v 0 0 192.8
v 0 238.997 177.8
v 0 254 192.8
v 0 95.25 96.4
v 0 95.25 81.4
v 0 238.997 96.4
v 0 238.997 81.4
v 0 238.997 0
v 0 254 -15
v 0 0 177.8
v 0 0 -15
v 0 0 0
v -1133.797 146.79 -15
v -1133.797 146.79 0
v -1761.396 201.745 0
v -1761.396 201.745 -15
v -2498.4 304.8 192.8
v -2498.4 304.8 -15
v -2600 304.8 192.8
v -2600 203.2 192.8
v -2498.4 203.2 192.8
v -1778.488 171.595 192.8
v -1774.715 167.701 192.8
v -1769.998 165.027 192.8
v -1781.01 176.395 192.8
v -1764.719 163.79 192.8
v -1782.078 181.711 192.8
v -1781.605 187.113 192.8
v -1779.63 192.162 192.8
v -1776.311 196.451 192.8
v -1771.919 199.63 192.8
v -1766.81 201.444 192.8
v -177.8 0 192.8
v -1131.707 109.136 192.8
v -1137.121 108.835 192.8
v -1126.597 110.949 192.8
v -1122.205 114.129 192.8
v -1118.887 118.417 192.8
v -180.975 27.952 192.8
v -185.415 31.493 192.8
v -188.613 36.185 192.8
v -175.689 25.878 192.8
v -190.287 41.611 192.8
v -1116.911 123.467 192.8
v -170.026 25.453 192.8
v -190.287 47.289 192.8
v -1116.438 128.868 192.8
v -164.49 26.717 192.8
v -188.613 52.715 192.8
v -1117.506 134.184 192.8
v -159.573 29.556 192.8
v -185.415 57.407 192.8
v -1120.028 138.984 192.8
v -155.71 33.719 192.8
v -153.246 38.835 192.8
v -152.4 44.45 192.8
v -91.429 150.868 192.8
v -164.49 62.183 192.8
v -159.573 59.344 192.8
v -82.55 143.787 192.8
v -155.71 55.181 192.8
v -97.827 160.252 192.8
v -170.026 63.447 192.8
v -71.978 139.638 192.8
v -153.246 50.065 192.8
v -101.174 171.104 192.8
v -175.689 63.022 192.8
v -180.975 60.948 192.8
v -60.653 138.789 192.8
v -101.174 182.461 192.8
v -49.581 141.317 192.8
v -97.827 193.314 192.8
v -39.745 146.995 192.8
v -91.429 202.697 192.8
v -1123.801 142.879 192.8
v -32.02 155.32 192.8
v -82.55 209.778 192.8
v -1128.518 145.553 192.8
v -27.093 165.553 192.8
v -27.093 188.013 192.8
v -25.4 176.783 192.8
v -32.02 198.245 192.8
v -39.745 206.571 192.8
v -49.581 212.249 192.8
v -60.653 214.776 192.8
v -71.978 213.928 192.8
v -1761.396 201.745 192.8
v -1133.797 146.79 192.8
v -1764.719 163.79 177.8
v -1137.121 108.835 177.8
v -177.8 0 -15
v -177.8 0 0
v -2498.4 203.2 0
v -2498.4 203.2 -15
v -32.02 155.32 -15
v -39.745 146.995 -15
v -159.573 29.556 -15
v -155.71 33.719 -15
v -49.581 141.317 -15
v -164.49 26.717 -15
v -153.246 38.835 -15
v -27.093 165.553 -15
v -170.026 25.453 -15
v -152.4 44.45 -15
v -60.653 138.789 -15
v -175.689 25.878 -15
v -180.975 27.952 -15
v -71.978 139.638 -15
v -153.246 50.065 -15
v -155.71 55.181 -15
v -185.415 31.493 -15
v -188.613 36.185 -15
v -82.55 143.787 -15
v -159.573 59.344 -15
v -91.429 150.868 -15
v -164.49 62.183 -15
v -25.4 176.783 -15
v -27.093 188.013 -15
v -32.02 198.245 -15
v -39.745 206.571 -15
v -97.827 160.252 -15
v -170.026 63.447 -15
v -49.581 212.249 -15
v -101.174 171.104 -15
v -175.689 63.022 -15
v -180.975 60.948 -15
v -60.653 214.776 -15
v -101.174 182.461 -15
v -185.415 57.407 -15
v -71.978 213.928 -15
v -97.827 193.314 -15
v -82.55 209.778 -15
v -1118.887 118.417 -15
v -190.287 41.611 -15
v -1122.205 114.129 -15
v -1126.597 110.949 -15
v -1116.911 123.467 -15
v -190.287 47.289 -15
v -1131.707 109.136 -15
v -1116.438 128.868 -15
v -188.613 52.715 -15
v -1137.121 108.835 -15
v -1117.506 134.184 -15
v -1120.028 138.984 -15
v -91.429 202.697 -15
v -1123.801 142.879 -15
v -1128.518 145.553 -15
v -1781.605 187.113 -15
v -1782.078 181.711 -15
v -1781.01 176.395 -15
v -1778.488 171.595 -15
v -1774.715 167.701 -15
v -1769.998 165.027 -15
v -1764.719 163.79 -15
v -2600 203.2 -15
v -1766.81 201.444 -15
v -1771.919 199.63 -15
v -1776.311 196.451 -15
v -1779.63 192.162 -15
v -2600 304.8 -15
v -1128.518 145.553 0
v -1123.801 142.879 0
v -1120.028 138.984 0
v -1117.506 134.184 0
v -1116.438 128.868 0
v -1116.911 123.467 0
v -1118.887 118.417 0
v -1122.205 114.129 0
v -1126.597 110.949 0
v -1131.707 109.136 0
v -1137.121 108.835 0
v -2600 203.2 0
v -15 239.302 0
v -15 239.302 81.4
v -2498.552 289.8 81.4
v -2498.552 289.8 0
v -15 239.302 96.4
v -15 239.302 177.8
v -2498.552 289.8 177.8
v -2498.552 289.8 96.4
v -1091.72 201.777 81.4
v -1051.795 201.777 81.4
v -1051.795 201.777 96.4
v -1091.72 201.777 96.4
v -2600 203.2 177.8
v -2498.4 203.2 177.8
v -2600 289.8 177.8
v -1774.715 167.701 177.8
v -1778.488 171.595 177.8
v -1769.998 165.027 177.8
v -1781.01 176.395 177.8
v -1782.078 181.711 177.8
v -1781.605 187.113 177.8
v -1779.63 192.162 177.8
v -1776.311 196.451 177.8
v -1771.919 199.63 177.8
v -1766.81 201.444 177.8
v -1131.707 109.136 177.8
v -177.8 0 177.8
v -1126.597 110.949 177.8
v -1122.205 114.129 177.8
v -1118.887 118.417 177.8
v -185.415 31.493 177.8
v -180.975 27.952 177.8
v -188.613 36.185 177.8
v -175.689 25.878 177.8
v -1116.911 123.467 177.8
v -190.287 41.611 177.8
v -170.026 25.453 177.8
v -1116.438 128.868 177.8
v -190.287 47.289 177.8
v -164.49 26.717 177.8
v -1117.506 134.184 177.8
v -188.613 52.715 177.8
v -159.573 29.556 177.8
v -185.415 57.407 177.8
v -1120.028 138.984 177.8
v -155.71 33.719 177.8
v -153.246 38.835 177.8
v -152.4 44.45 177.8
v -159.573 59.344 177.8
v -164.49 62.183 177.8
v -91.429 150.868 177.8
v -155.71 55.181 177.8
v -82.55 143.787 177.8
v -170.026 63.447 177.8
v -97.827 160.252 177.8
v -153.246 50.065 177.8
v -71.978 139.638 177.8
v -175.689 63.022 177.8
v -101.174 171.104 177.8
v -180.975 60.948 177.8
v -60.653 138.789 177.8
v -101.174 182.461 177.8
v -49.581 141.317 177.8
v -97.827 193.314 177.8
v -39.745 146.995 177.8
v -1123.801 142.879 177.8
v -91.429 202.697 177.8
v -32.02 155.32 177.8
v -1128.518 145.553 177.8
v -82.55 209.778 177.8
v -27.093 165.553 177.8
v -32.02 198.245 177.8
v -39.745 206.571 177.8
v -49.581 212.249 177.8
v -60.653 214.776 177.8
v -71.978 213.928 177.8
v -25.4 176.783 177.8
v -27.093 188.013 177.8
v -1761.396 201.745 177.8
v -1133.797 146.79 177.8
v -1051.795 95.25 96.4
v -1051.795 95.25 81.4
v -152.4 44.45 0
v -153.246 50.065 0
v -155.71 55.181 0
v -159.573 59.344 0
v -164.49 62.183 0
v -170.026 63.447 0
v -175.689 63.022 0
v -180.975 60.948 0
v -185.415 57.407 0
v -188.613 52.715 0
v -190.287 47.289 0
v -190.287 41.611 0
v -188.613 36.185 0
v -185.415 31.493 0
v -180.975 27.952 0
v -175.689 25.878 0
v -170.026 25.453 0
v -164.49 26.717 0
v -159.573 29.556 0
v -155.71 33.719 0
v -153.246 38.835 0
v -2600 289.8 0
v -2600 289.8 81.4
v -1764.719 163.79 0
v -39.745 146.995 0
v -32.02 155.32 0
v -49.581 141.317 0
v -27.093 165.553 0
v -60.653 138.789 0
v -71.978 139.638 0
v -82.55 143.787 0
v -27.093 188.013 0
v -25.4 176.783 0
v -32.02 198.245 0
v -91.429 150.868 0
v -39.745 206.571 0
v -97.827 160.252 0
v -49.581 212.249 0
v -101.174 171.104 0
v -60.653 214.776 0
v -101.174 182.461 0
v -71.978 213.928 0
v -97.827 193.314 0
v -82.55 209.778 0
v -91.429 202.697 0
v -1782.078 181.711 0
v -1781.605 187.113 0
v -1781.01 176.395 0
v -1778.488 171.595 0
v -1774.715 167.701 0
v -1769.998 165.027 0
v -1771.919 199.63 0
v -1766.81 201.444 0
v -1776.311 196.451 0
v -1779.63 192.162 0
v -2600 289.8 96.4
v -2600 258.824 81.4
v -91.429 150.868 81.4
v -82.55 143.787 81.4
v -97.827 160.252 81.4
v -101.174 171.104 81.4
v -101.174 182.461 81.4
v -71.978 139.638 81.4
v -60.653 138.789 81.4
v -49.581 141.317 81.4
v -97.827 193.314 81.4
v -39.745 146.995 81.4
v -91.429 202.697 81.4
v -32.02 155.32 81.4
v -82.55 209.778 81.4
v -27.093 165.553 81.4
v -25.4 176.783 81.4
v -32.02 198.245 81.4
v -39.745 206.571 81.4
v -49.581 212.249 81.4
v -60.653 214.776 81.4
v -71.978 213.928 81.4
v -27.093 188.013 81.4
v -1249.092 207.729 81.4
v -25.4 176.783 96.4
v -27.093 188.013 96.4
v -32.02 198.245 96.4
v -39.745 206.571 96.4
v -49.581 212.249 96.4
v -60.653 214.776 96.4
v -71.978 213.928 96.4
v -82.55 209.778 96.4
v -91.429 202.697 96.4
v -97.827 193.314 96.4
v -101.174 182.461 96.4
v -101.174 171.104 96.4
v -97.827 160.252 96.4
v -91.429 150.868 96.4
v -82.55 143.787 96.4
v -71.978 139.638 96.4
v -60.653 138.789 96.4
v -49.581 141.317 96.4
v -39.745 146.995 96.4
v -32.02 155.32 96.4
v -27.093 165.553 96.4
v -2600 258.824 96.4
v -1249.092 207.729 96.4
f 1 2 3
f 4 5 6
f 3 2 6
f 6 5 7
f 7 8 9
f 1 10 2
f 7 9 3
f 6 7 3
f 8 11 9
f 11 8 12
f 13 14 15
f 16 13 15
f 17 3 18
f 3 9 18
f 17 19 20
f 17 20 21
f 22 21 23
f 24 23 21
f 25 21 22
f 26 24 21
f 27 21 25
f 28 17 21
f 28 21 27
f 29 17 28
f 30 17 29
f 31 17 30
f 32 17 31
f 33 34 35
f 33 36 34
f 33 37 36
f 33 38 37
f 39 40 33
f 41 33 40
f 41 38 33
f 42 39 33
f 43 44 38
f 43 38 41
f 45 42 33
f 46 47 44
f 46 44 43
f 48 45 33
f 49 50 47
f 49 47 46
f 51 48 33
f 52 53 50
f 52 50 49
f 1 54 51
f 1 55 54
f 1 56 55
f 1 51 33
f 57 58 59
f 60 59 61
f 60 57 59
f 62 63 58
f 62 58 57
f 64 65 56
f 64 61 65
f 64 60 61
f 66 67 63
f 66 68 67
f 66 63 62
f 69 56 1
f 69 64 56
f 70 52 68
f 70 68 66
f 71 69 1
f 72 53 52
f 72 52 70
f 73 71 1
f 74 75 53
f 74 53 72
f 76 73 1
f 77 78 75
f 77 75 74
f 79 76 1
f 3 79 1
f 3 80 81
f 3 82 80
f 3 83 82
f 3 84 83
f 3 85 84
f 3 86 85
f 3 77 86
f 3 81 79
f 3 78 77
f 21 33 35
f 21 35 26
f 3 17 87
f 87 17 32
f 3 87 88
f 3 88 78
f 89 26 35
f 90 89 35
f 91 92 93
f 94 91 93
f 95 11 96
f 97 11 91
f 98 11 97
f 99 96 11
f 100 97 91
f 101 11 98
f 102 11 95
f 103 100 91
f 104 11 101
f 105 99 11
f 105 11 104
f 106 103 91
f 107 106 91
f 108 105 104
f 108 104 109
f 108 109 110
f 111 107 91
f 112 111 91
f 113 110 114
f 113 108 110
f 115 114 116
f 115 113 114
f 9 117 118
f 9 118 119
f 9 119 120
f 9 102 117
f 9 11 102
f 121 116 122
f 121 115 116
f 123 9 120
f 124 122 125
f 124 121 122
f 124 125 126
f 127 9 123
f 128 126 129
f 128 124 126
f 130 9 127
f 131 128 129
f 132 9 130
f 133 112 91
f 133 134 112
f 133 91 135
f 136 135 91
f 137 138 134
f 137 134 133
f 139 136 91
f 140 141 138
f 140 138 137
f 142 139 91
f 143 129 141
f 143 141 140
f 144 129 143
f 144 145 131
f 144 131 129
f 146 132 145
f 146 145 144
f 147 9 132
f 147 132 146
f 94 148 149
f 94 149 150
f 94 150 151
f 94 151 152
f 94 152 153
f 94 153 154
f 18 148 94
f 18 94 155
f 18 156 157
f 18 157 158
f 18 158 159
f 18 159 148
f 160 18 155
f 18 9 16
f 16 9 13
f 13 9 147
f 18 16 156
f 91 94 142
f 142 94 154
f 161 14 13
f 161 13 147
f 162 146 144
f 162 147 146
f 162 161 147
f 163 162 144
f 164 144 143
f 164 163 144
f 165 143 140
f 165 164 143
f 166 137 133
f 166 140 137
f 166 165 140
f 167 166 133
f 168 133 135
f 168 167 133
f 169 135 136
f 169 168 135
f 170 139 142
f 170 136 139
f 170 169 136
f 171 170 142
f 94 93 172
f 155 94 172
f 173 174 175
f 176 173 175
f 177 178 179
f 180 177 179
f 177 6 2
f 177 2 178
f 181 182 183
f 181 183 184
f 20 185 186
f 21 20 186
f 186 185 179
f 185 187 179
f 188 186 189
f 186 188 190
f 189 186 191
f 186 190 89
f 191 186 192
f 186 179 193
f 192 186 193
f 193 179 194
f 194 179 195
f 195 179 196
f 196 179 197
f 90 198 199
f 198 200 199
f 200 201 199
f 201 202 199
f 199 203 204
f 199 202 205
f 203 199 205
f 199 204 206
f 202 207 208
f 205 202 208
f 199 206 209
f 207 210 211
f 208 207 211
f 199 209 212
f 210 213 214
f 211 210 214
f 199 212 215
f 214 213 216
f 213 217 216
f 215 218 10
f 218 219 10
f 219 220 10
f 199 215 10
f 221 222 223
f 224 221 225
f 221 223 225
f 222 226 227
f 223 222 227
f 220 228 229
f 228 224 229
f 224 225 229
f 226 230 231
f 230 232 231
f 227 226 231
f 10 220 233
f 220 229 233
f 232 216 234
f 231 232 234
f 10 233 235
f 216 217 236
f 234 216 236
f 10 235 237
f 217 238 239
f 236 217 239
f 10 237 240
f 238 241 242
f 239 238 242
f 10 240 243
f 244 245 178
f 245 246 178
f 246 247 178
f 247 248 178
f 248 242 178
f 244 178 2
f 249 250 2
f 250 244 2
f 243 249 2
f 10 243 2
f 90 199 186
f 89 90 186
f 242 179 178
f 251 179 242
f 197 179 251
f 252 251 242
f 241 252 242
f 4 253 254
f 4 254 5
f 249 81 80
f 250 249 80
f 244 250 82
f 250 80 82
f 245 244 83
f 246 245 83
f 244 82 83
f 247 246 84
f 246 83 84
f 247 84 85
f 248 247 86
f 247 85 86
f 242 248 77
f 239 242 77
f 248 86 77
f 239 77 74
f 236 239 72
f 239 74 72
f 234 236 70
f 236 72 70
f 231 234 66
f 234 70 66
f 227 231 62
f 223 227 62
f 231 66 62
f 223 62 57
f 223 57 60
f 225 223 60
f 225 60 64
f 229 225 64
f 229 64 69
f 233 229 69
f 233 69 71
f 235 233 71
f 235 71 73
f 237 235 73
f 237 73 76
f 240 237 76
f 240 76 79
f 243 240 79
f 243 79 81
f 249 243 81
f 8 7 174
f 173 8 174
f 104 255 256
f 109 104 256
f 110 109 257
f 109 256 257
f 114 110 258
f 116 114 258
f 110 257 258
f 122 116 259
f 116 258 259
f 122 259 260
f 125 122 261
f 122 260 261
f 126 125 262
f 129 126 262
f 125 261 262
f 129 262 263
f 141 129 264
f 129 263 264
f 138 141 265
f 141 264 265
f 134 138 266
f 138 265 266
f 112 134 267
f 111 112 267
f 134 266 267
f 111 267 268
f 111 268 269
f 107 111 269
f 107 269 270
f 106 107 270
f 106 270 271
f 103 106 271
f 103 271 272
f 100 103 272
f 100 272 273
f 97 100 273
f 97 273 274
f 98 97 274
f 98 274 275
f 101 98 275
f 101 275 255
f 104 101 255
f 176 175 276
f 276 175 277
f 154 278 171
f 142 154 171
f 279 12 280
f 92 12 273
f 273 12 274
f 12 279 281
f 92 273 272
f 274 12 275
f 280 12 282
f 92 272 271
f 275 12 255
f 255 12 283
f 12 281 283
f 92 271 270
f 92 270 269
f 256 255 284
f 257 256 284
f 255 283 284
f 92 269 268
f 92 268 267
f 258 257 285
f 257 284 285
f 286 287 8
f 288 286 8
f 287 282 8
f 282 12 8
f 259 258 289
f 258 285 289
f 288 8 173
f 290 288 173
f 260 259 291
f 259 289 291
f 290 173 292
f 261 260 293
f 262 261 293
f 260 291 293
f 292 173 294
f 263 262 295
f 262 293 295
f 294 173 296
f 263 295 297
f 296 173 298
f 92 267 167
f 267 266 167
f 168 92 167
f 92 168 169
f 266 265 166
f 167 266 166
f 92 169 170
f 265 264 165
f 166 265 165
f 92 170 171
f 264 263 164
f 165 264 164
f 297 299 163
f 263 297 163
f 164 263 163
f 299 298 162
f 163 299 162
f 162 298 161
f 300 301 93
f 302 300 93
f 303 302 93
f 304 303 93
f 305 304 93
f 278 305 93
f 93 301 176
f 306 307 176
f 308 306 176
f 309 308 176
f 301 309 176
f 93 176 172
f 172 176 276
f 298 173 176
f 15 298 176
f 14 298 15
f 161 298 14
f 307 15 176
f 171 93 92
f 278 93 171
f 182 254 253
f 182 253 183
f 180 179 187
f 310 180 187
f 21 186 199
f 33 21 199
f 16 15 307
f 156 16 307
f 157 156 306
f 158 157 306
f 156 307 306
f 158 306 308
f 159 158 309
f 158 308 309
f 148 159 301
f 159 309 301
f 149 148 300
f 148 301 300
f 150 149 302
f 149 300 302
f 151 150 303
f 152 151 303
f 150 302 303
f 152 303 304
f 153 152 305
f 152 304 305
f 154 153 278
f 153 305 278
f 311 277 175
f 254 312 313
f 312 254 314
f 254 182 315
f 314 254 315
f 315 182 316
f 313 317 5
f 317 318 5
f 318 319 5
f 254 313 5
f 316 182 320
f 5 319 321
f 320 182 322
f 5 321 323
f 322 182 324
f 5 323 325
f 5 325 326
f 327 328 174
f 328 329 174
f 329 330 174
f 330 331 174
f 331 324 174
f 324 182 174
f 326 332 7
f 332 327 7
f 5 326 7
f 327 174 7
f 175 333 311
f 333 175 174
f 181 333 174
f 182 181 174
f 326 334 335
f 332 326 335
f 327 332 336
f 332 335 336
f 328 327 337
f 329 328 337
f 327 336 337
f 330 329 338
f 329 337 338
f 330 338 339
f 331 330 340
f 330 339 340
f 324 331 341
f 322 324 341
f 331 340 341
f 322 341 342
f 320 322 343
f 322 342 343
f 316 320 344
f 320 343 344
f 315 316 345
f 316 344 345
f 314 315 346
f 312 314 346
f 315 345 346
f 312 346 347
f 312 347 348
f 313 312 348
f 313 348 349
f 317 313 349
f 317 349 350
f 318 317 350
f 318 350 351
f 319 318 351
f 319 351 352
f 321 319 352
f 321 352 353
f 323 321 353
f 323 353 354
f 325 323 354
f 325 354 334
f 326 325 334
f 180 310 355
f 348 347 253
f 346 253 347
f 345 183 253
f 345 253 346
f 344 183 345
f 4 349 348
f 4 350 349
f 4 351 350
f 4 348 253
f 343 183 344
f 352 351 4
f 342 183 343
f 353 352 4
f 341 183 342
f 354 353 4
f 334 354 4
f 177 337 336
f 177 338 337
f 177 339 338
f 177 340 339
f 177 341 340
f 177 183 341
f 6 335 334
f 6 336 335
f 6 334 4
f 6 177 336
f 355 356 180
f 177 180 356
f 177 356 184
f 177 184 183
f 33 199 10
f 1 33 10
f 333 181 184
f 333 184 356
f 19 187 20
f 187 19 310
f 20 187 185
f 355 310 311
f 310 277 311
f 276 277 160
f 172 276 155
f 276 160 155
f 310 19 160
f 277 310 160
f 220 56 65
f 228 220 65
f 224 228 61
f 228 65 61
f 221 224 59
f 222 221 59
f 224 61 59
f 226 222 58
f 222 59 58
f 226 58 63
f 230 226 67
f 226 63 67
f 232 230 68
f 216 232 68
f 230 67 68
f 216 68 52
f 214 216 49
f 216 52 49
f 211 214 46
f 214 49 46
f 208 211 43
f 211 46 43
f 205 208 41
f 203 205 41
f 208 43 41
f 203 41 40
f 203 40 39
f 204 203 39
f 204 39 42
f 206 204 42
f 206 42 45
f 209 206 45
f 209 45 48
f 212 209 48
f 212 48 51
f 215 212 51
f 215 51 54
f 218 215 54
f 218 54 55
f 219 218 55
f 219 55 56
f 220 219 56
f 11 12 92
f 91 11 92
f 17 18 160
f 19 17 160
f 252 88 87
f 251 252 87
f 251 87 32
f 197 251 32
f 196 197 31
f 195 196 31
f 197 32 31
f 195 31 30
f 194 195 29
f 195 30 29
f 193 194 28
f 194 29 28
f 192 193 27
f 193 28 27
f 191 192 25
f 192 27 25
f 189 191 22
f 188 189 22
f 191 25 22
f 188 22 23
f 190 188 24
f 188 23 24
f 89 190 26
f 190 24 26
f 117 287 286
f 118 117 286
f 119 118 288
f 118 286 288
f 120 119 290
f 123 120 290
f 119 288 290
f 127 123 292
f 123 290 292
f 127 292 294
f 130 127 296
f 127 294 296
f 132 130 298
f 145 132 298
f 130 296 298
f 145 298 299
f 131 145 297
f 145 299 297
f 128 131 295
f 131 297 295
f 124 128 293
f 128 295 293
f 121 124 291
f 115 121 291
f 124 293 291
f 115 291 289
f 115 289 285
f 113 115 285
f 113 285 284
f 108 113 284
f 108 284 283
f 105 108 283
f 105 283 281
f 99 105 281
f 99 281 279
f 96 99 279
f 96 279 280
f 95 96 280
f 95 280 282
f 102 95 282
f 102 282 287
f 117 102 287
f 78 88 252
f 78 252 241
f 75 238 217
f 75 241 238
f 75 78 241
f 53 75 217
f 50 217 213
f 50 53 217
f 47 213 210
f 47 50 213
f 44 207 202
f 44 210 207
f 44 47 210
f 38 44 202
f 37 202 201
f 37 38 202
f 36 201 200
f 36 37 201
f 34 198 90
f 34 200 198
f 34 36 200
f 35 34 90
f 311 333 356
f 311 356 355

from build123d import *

# Parameters (mm, degrees)
BOSS_EXTRUDE1_DEPTH      = 15
BOSS_EXTRUDE2_DEPTH      = 15
BOSS_EXTRUDE3_DEPTH      = 192.8
BOSS_EXTRUDE4_DEPTH      = 7.5
BOSS_EXTRUDE4_DEPTH_BACK = 7.5
SKETCH5_R                = 38.1
SKETCH5_R_2              = 19.05
CUT_EXTRUDE1_DEPTH       = 2627.039580814
CUT_EXTRUDE2_DEPTH       = 15
CUT_EXTRUDE12_DEPTH      = 60
CUT_EXTRUDE16_DEPTH      = 2627.039580814
CUT_EXTRUDE16_DEPTH_BACK = 2627.039580814
SKETCH16_R               = 19.05
CUT_EXTRUDE17_DEPTH      = 2627.039580814
CUT_EXTRUDE17_DEPTH_BACK = 2627.039580814
SKETCH18_W               = 39.925079479
SKETCH18_H               = 106.526969349
CUT_EXTRUDE18_DEPTH      = 96.4


with BuildPart() as part:
    # Sketch1 → Boss-Extrude1 (new body)
    with BuildSketch(Plane.XY):
        Polygon((-2600, 304.8), (-2498.4, 304.8), (0, 254), (0, 0), (-177.8, 0), (-2498.4, 203.2), (-2600, 203.2), align=None)
    extrude(amount=-BOSS_EXTRUDE1_DEPTH)



with BuildPart() as body_2:
    # Sketch2 → Boss-Extrude2 (new body)
    with BuildSketch(Plane.XY.offset(177.8)):
        Polygon((-2498.4, 203.2), (-177.8, 0), (0, 0), (0, 254), (-2498.4, 304.8), (-2600, 304.8), (-2600, 203.2), align=None)
    extrude(amount=BOSS_EXTRUDE2_DEPTH)


with BuildPart() as part_1:
    add(part.part)

    add(body_2.part)  # Boss-Extrude3 merges body 2
    # Sketch3 → Boss-Extrude3 (add)
    with BuildSketch(Plane.XY.offset(192.8)):
        Polygon((-2600, 289.8), (-2600, 304.8), (-2498.4, 304.8), (0, 254), (0, 238.996899585), (-15, 239.301894782), (-2498.55248184, 289.8), align=None)
    extrude(amount=-BOSS_EXTRUDE3_DEPTH)

    # Sketch6 → Boss-Extrude4 (add, two sides: drawn at the far end of the back side and taken through both)
    with BuildSketch(Plane.XY.offset(88.9).offset(-BOSS_EXTRUDE4_DEPTH_BACK)):
        Polygon((-2498.4, 203.2), (-177.8, 0), (0, 0), (0, 254), (-2498.4, 304.8), (-2600, 304.8), (-2600, 203.2), align=None)
    extrude(amount=BOSS_EXTRUDE4_DEPTH + BOSS_EXTRUDE4_DEPTH_BACK)

    # Sketch5 → Cut-Extrude1 (cut, through all)
    with BuildSketch(Plane.XY.offset(192.8)):
        with Locations((-63.5, 176.782795882)):
            Circle(SKETCH5_R)
        with Locations((-171.45, 44.45)):
            Circle(SKETCH5_R_2)
    extrude(amount=-CUT_EXTRUDE1_DEPTH, mode=Mode.SUBTRACT)

    # Sketch7 → Cut-Extrude2 (cut)
    with BuildSketch(Plane.XY.offset(96.4)):
        Polygon((-1265.58125, 95.25), (0, 95.25), (0, 0), (-177.8, 0), align=None)
    extrude(amount=-CUT_EXTRUDE2_DEPTH, mode=Mode.SUBTRACT)

    # Sketch13 → Cut-Extrude12 (cut)
    with BuildSketch(Plane(origin=(0, 0, 81.4), x_dir=(-1, 0, 0), z_dir=(0, 0, -1))):
        Polygon((2605.267563799, 259.022933261), (2605.624161029, 249.594727716), (2612.822921274, 133.887362854), (1105.756685281, 0), (1095.76383028, 0), (1095.76383028, 94.872046381), (1091.720431016, 201.776969349), (1249.091648094, 207.729124269), align=None)
    extrude(amount=-CUT_EXTRUDE12_DEPTH, mode=Mode.SUBTRACT)

    # Sketch16 → Cut-Extrude16 (cut, two sides: drawn at the far end of the back side and taken through both)
    with BuildSketch(Plane(origin=(0, 0, -15), x_dir=(-1, 0, 0), z_dir=(0, 0, -1)).offset(-CUT_EXTRUDE16_DEPTH_BACK)):
        with Locations((1135.45885, 127.8123918)):
            Circle(SKETCH16_R)
    extrude(amount=CUT_EXTRUDE16_DEPTH + CUT_EXTRUDE16_DEPTH_BACK, mode=Mode.SUBTRACT)

    # Sketch17 → Cut-Extrude17 (cut, two sides: drawn at the far end of the back side and taken through both)
    with BuildSketch(Plane(origin=(0, 0, -15), x_dir=(-1, 0, 0), z_dir=(0, 0, -1)).offset(-CUT_EXTRUDE17_DEPTH_BACK)):
        with BuildLine():
            Line((1133.797122541, 146.789777338), (1761.395699383, 201.744543697))
            ThreePointArc((1761.395699383, 201.744543697), (1782.03481238, 184.428885618), (1764.719154301, 163.789772622))
            Line((1764.719154301, 163.789772622), (1137.120577459, 108.835006262))
            ThreePointArc((1137.120577459, 108.835006262), (1116.481464462, 126.150664341), (1133.797122541, 146.789777338))
        make_face()
    extrude(amount=CUT_EXTRUDE17_DEPTH + CUT_EXTRUDE17_DEPTH_BACK, mode=Mode.SUBTRACT)

    # Sketch18 → Cut-Extrude18 (cut)
    with BuildSketch(Plane(origin=(0, 0, 81.4), x_dir=(-1, 0, 0), z_dir=(0, 0, -1))):
        with Locations((1071.757891277, 148.513484675)):
            Rectangle(SKETCH18_W, SKETCH18_H)
        Polygon((1110.039582386, 201.776969349), (1091.720431016, 201.776969349), (1095.749535172, 95.25), (1091.720431016, 95.25), (1091.720431016, 86.714646079), (1110.039582386, 86.714646079), align=None)
    extrude(amount=-CUT_EXTRUDE18_DEPTH, mode=Mode.SUBTRACT)


with BuildPart() as body_2_2:
    # of the pieces the cut leaves, the one that is kept (cut_extrude18_keep)
    add(part_1.part.solids().sort_by_distance((-2600, 304.8, -15))[0])


solid = body_2_2.part
